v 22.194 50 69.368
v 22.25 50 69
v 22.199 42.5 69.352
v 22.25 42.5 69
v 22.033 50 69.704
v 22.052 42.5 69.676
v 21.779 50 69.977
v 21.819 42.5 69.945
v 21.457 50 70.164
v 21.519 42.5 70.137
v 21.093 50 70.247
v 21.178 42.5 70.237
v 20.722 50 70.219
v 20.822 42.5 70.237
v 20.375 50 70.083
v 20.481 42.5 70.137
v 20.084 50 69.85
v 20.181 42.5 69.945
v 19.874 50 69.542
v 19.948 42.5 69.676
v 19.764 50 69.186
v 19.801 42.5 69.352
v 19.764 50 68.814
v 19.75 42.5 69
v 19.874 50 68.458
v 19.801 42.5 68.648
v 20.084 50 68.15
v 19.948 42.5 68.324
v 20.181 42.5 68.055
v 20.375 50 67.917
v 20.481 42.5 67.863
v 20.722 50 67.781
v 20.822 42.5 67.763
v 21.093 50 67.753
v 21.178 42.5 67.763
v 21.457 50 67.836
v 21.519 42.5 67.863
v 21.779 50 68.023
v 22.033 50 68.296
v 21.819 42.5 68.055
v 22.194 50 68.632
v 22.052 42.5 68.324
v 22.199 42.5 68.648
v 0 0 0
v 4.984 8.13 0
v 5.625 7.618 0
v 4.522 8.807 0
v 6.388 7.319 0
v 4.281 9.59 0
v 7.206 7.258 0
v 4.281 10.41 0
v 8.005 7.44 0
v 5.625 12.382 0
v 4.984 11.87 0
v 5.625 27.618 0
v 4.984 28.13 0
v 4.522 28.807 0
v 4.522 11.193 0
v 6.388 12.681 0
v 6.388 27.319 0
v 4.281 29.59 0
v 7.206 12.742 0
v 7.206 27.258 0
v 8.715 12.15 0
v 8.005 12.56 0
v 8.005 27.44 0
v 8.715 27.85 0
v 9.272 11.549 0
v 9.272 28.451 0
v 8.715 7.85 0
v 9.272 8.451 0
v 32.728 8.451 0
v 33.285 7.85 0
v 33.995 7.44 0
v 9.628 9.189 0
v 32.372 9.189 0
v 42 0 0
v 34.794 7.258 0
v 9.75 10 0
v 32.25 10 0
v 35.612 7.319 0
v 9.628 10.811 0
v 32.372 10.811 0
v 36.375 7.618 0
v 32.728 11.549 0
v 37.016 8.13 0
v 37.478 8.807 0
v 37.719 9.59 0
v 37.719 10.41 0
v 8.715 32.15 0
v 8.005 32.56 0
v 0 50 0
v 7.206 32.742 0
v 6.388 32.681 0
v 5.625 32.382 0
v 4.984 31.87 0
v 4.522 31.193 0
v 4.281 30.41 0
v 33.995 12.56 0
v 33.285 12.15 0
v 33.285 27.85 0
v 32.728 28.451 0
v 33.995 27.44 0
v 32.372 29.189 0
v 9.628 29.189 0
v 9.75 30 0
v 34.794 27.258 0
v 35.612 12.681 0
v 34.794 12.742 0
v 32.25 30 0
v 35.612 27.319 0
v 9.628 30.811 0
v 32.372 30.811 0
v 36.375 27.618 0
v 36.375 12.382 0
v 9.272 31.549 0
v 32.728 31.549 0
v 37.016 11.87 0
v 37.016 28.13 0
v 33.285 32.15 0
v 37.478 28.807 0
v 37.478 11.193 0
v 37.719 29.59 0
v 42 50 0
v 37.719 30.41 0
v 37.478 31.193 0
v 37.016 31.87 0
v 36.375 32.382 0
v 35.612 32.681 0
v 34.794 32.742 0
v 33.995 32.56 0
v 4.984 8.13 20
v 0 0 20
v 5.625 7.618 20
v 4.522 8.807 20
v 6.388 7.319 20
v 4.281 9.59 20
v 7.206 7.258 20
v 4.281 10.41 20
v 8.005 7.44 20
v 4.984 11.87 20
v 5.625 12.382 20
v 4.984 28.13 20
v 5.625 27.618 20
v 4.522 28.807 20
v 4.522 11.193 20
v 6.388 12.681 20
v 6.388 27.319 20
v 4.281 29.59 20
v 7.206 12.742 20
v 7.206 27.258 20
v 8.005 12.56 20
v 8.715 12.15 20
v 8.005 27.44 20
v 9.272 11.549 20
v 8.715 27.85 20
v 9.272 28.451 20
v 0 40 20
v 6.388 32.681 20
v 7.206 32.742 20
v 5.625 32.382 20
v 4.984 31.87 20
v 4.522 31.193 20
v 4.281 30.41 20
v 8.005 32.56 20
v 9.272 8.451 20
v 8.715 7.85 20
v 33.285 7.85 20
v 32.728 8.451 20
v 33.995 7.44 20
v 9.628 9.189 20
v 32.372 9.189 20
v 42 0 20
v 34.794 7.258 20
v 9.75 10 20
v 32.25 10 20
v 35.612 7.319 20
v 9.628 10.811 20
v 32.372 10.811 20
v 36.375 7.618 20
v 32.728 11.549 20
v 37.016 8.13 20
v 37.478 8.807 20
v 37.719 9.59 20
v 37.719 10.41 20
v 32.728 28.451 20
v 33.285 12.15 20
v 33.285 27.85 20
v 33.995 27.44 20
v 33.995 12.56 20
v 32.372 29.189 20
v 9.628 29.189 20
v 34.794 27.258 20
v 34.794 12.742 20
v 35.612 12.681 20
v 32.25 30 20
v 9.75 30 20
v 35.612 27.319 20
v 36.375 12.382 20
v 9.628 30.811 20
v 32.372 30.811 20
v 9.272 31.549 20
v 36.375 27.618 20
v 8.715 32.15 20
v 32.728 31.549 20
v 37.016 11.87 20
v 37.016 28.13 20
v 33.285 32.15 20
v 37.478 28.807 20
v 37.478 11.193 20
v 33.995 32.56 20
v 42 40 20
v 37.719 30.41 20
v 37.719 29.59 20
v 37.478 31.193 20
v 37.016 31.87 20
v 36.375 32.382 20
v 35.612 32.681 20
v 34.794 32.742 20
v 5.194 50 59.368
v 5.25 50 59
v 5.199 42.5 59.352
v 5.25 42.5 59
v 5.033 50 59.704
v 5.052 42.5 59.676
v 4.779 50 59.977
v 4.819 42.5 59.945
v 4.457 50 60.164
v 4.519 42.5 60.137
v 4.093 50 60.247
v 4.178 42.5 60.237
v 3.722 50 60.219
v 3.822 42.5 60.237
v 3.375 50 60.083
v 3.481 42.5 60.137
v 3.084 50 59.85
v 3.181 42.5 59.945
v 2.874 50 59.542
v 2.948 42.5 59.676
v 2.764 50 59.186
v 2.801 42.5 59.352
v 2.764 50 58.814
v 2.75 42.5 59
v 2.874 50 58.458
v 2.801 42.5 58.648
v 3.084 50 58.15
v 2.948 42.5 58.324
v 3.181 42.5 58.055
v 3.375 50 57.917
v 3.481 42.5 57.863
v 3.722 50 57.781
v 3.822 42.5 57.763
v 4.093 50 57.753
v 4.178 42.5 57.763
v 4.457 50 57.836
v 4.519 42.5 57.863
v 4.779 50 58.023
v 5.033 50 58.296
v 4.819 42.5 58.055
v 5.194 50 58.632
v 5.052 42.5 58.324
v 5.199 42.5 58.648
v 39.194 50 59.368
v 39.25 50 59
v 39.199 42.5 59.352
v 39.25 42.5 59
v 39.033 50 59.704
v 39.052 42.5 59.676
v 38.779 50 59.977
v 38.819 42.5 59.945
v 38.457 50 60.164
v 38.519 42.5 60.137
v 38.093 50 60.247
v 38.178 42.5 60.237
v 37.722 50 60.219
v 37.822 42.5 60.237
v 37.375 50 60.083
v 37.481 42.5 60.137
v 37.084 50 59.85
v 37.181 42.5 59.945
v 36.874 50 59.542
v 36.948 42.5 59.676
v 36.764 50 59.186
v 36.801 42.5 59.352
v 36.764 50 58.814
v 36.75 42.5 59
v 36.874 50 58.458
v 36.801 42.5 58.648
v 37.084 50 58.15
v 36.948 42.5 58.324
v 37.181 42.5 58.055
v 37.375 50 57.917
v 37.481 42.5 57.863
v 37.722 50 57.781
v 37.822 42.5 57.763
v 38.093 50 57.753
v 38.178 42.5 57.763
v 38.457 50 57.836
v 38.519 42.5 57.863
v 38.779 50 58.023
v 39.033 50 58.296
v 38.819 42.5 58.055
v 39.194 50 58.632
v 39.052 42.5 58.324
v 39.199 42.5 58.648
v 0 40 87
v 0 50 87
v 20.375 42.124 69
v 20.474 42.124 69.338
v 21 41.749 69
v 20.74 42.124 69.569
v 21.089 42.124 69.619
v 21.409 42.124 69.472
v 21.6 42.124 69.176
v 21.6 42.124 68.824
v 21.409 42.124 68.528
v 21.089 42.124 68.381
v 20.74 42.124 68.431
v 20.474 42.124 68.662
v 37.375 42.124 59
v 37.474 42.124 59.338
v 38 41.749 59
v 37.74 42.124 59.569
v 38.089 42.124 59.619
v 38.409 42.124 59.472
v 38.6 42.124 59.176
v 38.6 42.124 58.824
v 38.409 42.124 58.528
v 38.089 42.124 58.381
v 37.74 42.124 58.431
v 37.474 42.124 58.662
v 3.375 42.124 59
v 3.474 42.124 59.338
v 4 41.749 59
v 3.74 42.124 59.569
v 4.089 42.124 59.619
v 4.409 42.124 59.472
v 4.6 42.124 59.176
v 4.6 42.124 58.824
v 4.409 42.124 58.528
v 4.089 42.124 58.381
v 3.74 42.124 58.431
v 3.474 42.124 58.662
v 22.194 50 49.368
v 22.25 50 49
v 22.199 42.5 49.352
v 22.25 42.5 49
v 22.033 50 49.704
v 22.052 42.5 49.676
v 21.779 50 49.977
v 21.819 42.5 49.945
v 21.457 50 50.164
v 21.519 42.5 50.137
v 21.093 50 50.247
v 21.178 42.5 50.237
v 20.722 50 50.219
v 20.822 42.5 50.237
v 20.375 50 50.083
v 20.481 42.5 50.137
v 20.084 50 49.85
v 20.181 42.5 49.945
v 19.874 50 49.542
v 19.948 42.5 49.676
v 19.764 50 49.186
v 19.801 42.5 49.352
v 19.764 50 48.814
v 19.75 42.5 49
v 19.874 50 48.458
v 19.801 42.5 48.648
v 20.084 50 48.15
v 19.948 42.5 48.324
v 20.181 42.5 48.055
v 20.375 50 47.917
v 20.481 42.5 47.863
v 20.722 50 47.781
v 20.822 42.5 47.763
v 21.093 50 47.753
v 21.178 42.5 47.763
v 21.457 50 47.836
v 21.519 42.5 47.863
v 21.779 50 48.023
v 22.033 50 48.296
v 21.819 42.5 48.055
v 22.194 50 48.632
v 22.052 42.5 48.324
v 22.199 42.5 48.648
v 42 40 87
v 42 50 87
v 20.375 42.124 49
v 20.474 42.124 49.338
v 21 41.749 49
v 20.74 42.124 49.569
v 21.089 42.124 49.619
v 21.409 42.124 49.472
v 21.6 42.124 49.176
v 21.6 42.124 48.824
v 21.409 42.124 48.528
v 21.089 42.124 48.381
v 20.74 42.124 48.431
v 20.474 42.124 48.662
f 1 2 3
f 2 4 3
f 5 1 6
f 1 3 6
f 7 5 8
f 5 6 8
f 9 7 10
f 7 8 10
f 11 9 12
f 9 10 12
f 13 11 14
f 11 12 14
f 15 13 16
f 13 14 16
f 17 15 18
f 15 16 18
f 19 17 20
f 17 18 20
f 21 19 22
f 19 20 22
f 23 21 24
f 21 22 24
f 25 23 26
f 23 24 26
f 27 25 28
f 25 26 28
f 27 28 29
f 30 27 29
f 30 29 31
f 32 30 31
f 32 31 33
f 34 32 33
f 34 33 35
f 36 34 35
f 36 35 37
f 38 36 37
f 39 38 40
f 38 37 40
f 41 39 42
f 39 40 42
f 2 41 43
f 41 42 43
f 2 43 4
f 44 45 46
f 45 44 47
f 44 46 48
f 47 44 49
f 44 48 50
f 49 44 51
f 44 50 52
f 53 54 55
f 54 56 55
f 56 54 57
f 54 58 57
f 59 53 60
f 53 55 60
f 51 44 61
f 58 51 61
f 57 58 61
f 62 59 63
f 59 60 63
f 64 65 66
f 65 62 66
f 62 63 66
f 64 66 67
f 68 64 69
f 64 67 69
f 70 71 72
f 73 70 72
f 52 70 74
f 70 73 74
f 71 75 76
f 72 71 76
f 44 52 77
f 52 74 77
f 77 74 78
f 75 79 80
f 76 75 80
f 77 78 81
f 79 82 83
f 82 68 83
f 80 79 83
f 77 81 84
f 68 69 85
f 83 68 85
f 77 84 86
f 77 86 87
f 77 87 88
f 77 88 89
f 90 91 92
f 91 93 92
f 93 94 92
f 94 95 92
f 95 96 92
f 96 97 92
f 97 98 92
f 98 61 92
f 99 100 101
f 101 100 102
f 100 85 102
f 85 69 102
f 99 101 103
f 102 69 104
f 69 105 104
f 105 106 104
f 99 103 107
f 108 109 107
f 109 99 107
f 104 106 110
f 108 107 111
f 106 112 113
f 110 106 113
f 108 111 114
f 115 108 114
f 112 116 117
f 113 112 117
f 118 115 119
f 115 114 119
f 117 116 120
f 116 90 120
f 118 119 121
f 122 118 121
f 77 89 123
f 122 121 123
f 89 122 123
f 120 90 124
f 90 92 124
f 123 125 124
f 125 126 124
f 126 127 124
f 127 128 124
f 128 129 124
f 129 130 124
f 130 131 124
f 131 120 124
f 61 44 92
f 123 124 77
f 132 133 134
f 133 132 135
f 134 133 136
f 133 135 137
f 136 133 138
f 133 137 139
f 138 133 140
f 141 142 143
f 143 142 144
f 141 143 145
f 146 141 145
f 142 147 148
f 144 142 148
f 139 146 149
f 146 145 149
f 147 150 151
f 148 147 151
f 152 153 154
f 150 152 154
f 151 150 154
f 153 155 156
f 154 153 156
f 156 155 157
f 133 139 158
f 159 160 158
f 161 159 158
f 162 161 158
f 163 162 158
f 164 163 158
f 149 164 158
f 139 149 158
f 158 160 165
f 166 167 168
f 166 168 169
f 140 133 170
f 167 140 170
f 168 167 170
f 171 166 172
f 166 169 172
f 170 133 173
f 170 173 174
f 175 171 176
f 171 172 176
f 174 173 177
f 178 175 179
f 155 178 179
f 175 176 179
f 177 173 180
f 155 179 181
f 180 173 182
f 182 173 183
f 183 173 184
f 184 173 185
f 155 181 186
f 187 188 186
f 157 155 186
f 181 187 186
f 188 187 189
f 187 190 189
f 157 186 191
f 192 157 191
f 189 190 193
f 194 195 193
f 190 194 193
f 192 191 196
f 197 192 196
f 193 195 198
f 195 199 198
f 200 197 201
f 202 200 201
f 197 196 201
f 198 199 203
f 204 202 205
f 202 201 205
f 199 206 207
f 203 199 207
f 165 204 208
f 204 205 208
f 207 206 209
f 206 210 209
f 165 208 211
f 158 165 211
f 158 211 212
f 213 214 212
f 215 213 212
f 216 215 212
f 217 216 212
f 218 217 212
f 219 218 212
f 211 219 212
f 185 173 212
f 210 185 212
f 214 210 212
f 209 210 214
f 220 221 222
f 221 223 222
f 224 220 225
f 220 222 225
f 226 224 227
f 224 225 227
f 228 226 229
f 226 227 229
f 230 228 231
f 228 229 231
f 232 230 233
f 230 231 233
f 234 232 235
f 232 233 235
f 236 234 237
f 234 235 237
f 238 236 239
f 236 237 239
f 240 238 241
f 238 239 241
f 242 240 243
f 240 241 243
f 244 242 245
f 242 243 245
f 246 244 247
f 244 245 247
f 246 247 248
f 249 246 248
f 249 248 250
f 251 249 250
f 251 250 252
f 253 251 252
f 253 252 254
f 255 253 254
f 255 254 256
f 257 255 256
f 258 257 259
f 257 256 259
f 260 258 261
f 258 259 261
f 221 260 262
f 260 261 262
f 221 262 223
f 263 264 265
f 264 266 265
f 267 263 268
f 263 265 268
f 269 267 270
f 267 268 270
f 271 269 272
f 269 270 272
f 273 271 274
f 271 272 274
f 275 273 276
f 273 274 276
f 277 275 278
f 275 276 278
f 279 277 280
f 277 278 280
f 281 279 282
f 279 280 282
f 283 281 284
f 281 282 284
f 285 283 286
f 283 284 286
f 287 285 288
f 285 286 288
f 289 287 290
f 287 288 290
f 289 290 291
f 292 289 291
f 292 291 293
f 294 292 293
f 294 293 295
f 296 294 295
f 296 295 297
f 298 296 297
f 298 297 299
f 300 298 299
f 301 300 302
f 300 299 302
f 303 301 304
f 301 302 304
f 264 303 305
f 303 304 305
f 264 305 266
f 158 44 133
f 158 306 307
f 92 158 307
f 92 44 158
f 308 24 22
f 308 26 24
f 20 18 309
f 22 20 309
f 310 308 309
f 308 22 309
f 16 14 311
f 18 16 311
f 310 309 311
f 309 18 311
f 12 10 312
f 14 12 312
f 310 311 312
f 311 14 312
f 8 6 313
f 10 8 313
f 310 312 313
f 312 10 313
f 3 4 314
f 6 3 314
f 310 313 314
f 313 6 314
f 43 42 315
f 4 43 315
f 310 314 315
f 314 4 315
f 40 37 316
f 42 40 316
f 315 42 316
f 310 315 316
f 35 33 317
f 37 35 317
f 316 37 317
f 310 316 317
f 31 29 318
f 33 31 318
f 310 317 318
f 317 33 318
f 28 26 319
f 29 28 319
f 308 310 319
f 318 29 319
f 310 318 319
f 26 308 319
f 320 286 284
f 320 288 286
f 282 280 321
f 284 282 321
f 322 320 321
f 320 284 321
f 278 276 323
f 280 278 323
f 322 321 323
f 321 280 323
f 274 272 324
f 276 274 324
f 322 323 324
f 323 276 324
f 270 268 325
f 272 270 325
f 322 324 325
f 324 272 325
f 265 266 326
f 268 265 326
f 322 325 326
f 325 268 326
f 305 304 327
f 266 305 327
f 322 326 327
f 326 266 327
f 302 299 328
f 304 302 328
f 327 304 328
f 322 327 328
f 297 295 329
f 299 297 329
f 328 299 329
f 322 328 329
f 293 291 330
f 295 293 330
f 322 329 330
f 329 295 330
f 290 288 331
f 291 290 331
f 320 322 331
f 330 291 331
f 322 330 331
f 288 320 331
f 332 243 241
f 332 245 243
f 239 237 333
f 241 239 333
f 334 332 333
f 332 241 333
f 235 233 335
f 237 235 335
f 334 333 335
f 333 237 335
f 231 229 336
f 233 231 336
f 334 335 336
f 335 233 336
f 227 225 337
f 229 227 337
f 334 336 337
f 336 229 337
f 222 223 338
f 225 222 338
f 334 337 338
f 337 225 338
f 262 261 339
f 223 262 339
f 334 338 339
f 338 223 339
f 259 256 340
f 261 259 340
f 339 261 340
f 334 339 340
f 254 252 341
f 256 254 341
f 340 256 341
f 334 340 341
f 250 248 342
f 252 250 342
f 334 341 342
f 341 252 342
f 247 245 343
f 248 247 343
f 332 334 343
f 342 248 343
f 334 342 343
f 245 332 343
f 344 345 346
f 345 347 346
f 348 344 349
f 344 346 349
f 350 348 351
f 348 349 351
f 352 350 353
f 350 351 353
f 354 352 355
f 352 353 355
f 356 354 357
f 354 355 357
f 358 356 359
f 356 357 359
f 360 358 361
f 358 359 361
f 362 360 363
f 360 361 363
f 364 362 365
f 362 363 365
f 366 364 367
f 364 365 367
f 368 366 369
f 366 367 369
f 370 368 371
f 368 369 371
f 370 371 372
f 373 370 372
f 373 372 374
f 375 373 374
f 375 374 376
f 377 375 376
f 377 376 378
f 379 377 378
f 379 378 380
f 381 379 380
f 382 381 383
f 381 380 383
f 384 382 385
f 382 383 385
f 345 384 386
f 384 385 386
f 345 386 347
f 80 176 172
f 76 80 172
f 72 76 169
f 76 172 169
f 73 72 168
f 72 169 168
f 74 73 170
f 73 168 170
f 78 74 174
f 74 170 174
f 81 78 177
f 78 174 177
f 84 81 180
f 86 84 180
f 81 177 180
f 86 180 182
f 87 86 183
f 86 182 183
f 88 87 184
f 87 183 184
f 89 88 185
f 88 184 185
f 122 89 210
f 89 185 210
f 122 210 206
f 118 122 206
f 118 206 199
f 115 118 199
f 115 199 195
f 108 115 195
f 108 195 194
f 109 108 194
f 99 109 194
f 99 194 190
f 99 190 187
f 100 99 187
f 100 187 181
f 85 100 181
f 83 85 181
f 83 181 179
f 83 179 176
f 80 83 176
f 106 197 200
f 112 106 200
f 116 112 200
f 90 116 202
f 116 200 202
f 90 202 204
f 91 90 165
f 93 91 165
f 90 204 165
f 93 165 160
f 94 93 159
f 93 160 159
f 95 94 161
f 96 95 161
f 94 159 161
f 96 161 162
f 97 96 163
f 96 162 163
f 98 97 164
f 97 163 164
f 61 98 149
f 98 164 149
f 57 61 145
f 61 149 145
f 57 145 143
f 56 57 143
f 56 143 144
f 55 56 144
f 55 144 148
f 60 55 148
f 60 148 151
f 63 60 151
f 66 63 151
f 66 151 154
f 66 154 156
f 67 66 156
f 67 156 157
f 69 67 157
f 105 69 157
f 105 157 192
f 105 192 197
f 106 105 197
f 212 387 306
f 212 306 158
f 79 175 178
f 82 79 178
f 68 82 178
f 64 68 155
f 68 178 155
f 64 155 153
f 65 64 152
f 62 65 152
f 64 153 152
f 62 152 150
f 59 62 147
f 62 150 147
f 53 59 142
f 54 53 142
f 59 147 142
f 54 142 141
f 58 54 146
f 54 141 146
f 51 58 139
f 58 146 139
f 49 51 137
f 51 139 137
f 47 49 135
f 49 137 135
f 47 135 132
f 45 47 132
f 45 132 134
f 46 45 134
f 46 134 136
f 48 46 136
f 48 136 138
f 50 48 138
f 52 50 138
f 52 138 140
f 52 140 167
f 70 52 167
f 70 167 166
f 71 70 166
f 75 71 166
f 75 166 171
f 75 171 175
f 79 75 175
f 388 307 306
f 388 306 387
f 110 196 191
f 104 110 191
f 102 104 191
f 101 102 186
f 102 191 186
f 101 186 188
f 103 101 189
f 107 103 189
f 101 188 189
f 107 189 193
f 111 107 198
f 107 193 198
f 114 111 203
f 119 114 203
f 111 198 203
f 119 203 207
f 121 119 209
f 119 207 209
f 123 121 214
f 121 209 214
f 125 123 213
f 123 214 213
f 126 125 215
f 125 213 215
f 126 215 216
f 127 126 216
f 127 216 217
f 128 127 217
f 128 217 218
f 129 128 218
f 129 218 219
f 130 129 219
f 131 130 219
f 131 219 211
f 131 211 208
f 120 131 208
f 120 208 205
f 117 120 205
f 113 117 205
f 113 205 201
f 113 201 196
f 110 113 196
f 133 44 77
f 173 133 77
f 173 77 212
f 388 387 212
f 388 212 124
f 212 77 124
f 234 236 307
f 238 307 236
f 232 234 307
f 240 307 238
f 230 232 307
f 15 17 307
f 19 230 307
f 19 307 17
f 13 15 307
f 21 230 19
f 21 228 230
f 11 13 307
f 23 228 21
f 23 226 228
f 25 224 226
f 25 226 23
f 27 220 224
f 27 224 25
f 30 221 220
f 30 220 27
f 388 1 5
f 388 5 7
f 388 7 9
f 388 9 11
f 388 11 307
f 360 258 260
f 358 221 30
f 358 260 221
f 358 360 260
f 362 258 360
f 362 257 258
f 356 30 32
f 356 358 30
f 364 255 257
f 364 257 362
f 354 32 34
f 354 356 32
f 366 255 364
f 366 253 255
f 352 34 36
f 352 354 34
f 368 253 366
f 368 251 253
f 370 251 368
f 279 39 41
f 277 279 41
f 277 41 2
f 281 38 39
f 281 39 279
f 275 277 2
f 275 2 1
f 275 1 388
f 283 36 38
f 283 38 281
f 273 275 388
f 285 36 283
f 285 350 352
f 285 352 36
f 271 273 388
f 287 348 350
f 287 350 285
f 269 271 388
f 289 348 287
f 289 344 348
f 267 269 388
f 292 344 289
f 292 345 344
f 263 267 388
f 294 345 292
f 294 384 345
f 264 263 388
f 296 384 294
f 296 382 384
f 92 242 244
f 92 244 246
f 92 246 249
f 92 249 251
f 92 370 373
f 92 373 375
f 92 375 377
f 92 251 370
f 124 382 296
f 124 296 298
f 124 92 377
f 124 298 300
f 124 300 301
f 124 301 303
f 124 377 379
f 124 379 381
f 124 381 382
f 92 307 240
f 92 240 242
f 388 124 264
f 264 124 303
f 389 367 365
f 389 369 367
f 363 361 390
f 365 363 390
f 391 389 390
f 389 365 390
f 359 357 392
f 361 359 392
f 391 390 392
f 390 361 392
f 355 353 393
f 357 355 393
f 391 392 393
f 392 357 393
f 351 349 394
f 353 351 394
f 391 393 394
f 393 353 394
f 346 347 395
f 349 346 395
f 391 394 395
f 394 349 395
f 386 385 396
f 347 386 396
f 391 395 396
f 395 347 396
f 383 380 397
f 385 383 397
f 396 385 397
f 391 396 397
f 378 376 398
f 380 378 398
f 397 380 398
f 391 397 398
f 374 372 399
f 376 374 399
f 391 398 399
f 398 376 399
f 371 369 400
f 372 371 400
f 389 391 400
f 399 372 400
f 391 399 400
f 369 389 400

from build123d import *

# Parameters (mm, degrees)
SKETCH_1_W             = 42
SKETCH_1_H             = 50
EXTRUDE_1_DEPTH        = 87
SKETCH_2_W             = 67
SKETCH_2_H             = 40
CUT_EXTRUDE_1_DEPTH    = 109.779593675
SKETCH_3_R             = 2.75
CUT_EXTRUDE_2_DEPTH    = 94.55746897
HOLE_WIZARD_M3_1_D     = 2.5
HOLE_WIZARD_M3_1_DEPTH = 7.5
HOLE_WIZARD_M3_1_TIP   = 0.751075774


with BuildPart() as part:
    # 草图1 → 凸台-拉伸1 (new body)
    with BuildSketch(Plane.XY):
        with Locations((21, 25)):
            Rectangle(SKETCH_1_W, SKETCH_1_H)
    extrude(amount=EXTRUDE_1_DEPTH)

    # 草图2 → 切除-拉伸1 (cut, through all)
    with BuildSketch(Plane(origin=(42, 0, 0), x_dir=(0, 0, -1), z_dir=(1, 0, 0))):
        with Locations((-53.5, 20)):
            Rectangle(SKETCH_2_W, SKETCH_2_H)
    extrude(amount=-CUT_EXTRUDE_1_DEPTH, mode=Mode.SUBTRACT)

    # 草图3 → 切除-拉伸2 (cut, through all)
    with BuildSketch(Plane.XY.offset(20)):
        with Locations((7, 30)):
            Circle(SKETCH_3_R)
        with Locations((7, 10)):
            Circle(SKETCH_3_R)
        with Locations(Location((35, 10, 0), (0, 0, 180))):
            Circle(SKETCH_3_R)
        with Locations(Location((35, 30, 0), (0, 0, 180))):
            Circle(SKETCH_3_R)
    extrude(amount=-CUT_EXTRUDE_2_DEPTH, mode=Mode.SUBTRACT)

    # M3 螺纹孔1
    with Locations(Plane(origin=(0, 50, 0), x_dir=(-1, 0, 0), z_dir=(0, 1, 0))):
        with Locations((-4, 59), (-21, 49), (-38, 59), (-21, 69)):
            Hole(HOLE_WIZARD_M3_1_D / 2, depth=HOLE_WIZARD_M3_1_DEPTH)
            with Locations((0, 0, -(HOLE_WIZARD_M3_1_DEPTH + HOLE_WIZARD_M3_1_TIP / 2))):  # 118° drill point
                Cone(0, HOLE_WIZARD_M3_1_D / 2, HOLE_WIZARD_M3_1_TIP, mode=Mode.SUBTRACT)


solid = part.part
